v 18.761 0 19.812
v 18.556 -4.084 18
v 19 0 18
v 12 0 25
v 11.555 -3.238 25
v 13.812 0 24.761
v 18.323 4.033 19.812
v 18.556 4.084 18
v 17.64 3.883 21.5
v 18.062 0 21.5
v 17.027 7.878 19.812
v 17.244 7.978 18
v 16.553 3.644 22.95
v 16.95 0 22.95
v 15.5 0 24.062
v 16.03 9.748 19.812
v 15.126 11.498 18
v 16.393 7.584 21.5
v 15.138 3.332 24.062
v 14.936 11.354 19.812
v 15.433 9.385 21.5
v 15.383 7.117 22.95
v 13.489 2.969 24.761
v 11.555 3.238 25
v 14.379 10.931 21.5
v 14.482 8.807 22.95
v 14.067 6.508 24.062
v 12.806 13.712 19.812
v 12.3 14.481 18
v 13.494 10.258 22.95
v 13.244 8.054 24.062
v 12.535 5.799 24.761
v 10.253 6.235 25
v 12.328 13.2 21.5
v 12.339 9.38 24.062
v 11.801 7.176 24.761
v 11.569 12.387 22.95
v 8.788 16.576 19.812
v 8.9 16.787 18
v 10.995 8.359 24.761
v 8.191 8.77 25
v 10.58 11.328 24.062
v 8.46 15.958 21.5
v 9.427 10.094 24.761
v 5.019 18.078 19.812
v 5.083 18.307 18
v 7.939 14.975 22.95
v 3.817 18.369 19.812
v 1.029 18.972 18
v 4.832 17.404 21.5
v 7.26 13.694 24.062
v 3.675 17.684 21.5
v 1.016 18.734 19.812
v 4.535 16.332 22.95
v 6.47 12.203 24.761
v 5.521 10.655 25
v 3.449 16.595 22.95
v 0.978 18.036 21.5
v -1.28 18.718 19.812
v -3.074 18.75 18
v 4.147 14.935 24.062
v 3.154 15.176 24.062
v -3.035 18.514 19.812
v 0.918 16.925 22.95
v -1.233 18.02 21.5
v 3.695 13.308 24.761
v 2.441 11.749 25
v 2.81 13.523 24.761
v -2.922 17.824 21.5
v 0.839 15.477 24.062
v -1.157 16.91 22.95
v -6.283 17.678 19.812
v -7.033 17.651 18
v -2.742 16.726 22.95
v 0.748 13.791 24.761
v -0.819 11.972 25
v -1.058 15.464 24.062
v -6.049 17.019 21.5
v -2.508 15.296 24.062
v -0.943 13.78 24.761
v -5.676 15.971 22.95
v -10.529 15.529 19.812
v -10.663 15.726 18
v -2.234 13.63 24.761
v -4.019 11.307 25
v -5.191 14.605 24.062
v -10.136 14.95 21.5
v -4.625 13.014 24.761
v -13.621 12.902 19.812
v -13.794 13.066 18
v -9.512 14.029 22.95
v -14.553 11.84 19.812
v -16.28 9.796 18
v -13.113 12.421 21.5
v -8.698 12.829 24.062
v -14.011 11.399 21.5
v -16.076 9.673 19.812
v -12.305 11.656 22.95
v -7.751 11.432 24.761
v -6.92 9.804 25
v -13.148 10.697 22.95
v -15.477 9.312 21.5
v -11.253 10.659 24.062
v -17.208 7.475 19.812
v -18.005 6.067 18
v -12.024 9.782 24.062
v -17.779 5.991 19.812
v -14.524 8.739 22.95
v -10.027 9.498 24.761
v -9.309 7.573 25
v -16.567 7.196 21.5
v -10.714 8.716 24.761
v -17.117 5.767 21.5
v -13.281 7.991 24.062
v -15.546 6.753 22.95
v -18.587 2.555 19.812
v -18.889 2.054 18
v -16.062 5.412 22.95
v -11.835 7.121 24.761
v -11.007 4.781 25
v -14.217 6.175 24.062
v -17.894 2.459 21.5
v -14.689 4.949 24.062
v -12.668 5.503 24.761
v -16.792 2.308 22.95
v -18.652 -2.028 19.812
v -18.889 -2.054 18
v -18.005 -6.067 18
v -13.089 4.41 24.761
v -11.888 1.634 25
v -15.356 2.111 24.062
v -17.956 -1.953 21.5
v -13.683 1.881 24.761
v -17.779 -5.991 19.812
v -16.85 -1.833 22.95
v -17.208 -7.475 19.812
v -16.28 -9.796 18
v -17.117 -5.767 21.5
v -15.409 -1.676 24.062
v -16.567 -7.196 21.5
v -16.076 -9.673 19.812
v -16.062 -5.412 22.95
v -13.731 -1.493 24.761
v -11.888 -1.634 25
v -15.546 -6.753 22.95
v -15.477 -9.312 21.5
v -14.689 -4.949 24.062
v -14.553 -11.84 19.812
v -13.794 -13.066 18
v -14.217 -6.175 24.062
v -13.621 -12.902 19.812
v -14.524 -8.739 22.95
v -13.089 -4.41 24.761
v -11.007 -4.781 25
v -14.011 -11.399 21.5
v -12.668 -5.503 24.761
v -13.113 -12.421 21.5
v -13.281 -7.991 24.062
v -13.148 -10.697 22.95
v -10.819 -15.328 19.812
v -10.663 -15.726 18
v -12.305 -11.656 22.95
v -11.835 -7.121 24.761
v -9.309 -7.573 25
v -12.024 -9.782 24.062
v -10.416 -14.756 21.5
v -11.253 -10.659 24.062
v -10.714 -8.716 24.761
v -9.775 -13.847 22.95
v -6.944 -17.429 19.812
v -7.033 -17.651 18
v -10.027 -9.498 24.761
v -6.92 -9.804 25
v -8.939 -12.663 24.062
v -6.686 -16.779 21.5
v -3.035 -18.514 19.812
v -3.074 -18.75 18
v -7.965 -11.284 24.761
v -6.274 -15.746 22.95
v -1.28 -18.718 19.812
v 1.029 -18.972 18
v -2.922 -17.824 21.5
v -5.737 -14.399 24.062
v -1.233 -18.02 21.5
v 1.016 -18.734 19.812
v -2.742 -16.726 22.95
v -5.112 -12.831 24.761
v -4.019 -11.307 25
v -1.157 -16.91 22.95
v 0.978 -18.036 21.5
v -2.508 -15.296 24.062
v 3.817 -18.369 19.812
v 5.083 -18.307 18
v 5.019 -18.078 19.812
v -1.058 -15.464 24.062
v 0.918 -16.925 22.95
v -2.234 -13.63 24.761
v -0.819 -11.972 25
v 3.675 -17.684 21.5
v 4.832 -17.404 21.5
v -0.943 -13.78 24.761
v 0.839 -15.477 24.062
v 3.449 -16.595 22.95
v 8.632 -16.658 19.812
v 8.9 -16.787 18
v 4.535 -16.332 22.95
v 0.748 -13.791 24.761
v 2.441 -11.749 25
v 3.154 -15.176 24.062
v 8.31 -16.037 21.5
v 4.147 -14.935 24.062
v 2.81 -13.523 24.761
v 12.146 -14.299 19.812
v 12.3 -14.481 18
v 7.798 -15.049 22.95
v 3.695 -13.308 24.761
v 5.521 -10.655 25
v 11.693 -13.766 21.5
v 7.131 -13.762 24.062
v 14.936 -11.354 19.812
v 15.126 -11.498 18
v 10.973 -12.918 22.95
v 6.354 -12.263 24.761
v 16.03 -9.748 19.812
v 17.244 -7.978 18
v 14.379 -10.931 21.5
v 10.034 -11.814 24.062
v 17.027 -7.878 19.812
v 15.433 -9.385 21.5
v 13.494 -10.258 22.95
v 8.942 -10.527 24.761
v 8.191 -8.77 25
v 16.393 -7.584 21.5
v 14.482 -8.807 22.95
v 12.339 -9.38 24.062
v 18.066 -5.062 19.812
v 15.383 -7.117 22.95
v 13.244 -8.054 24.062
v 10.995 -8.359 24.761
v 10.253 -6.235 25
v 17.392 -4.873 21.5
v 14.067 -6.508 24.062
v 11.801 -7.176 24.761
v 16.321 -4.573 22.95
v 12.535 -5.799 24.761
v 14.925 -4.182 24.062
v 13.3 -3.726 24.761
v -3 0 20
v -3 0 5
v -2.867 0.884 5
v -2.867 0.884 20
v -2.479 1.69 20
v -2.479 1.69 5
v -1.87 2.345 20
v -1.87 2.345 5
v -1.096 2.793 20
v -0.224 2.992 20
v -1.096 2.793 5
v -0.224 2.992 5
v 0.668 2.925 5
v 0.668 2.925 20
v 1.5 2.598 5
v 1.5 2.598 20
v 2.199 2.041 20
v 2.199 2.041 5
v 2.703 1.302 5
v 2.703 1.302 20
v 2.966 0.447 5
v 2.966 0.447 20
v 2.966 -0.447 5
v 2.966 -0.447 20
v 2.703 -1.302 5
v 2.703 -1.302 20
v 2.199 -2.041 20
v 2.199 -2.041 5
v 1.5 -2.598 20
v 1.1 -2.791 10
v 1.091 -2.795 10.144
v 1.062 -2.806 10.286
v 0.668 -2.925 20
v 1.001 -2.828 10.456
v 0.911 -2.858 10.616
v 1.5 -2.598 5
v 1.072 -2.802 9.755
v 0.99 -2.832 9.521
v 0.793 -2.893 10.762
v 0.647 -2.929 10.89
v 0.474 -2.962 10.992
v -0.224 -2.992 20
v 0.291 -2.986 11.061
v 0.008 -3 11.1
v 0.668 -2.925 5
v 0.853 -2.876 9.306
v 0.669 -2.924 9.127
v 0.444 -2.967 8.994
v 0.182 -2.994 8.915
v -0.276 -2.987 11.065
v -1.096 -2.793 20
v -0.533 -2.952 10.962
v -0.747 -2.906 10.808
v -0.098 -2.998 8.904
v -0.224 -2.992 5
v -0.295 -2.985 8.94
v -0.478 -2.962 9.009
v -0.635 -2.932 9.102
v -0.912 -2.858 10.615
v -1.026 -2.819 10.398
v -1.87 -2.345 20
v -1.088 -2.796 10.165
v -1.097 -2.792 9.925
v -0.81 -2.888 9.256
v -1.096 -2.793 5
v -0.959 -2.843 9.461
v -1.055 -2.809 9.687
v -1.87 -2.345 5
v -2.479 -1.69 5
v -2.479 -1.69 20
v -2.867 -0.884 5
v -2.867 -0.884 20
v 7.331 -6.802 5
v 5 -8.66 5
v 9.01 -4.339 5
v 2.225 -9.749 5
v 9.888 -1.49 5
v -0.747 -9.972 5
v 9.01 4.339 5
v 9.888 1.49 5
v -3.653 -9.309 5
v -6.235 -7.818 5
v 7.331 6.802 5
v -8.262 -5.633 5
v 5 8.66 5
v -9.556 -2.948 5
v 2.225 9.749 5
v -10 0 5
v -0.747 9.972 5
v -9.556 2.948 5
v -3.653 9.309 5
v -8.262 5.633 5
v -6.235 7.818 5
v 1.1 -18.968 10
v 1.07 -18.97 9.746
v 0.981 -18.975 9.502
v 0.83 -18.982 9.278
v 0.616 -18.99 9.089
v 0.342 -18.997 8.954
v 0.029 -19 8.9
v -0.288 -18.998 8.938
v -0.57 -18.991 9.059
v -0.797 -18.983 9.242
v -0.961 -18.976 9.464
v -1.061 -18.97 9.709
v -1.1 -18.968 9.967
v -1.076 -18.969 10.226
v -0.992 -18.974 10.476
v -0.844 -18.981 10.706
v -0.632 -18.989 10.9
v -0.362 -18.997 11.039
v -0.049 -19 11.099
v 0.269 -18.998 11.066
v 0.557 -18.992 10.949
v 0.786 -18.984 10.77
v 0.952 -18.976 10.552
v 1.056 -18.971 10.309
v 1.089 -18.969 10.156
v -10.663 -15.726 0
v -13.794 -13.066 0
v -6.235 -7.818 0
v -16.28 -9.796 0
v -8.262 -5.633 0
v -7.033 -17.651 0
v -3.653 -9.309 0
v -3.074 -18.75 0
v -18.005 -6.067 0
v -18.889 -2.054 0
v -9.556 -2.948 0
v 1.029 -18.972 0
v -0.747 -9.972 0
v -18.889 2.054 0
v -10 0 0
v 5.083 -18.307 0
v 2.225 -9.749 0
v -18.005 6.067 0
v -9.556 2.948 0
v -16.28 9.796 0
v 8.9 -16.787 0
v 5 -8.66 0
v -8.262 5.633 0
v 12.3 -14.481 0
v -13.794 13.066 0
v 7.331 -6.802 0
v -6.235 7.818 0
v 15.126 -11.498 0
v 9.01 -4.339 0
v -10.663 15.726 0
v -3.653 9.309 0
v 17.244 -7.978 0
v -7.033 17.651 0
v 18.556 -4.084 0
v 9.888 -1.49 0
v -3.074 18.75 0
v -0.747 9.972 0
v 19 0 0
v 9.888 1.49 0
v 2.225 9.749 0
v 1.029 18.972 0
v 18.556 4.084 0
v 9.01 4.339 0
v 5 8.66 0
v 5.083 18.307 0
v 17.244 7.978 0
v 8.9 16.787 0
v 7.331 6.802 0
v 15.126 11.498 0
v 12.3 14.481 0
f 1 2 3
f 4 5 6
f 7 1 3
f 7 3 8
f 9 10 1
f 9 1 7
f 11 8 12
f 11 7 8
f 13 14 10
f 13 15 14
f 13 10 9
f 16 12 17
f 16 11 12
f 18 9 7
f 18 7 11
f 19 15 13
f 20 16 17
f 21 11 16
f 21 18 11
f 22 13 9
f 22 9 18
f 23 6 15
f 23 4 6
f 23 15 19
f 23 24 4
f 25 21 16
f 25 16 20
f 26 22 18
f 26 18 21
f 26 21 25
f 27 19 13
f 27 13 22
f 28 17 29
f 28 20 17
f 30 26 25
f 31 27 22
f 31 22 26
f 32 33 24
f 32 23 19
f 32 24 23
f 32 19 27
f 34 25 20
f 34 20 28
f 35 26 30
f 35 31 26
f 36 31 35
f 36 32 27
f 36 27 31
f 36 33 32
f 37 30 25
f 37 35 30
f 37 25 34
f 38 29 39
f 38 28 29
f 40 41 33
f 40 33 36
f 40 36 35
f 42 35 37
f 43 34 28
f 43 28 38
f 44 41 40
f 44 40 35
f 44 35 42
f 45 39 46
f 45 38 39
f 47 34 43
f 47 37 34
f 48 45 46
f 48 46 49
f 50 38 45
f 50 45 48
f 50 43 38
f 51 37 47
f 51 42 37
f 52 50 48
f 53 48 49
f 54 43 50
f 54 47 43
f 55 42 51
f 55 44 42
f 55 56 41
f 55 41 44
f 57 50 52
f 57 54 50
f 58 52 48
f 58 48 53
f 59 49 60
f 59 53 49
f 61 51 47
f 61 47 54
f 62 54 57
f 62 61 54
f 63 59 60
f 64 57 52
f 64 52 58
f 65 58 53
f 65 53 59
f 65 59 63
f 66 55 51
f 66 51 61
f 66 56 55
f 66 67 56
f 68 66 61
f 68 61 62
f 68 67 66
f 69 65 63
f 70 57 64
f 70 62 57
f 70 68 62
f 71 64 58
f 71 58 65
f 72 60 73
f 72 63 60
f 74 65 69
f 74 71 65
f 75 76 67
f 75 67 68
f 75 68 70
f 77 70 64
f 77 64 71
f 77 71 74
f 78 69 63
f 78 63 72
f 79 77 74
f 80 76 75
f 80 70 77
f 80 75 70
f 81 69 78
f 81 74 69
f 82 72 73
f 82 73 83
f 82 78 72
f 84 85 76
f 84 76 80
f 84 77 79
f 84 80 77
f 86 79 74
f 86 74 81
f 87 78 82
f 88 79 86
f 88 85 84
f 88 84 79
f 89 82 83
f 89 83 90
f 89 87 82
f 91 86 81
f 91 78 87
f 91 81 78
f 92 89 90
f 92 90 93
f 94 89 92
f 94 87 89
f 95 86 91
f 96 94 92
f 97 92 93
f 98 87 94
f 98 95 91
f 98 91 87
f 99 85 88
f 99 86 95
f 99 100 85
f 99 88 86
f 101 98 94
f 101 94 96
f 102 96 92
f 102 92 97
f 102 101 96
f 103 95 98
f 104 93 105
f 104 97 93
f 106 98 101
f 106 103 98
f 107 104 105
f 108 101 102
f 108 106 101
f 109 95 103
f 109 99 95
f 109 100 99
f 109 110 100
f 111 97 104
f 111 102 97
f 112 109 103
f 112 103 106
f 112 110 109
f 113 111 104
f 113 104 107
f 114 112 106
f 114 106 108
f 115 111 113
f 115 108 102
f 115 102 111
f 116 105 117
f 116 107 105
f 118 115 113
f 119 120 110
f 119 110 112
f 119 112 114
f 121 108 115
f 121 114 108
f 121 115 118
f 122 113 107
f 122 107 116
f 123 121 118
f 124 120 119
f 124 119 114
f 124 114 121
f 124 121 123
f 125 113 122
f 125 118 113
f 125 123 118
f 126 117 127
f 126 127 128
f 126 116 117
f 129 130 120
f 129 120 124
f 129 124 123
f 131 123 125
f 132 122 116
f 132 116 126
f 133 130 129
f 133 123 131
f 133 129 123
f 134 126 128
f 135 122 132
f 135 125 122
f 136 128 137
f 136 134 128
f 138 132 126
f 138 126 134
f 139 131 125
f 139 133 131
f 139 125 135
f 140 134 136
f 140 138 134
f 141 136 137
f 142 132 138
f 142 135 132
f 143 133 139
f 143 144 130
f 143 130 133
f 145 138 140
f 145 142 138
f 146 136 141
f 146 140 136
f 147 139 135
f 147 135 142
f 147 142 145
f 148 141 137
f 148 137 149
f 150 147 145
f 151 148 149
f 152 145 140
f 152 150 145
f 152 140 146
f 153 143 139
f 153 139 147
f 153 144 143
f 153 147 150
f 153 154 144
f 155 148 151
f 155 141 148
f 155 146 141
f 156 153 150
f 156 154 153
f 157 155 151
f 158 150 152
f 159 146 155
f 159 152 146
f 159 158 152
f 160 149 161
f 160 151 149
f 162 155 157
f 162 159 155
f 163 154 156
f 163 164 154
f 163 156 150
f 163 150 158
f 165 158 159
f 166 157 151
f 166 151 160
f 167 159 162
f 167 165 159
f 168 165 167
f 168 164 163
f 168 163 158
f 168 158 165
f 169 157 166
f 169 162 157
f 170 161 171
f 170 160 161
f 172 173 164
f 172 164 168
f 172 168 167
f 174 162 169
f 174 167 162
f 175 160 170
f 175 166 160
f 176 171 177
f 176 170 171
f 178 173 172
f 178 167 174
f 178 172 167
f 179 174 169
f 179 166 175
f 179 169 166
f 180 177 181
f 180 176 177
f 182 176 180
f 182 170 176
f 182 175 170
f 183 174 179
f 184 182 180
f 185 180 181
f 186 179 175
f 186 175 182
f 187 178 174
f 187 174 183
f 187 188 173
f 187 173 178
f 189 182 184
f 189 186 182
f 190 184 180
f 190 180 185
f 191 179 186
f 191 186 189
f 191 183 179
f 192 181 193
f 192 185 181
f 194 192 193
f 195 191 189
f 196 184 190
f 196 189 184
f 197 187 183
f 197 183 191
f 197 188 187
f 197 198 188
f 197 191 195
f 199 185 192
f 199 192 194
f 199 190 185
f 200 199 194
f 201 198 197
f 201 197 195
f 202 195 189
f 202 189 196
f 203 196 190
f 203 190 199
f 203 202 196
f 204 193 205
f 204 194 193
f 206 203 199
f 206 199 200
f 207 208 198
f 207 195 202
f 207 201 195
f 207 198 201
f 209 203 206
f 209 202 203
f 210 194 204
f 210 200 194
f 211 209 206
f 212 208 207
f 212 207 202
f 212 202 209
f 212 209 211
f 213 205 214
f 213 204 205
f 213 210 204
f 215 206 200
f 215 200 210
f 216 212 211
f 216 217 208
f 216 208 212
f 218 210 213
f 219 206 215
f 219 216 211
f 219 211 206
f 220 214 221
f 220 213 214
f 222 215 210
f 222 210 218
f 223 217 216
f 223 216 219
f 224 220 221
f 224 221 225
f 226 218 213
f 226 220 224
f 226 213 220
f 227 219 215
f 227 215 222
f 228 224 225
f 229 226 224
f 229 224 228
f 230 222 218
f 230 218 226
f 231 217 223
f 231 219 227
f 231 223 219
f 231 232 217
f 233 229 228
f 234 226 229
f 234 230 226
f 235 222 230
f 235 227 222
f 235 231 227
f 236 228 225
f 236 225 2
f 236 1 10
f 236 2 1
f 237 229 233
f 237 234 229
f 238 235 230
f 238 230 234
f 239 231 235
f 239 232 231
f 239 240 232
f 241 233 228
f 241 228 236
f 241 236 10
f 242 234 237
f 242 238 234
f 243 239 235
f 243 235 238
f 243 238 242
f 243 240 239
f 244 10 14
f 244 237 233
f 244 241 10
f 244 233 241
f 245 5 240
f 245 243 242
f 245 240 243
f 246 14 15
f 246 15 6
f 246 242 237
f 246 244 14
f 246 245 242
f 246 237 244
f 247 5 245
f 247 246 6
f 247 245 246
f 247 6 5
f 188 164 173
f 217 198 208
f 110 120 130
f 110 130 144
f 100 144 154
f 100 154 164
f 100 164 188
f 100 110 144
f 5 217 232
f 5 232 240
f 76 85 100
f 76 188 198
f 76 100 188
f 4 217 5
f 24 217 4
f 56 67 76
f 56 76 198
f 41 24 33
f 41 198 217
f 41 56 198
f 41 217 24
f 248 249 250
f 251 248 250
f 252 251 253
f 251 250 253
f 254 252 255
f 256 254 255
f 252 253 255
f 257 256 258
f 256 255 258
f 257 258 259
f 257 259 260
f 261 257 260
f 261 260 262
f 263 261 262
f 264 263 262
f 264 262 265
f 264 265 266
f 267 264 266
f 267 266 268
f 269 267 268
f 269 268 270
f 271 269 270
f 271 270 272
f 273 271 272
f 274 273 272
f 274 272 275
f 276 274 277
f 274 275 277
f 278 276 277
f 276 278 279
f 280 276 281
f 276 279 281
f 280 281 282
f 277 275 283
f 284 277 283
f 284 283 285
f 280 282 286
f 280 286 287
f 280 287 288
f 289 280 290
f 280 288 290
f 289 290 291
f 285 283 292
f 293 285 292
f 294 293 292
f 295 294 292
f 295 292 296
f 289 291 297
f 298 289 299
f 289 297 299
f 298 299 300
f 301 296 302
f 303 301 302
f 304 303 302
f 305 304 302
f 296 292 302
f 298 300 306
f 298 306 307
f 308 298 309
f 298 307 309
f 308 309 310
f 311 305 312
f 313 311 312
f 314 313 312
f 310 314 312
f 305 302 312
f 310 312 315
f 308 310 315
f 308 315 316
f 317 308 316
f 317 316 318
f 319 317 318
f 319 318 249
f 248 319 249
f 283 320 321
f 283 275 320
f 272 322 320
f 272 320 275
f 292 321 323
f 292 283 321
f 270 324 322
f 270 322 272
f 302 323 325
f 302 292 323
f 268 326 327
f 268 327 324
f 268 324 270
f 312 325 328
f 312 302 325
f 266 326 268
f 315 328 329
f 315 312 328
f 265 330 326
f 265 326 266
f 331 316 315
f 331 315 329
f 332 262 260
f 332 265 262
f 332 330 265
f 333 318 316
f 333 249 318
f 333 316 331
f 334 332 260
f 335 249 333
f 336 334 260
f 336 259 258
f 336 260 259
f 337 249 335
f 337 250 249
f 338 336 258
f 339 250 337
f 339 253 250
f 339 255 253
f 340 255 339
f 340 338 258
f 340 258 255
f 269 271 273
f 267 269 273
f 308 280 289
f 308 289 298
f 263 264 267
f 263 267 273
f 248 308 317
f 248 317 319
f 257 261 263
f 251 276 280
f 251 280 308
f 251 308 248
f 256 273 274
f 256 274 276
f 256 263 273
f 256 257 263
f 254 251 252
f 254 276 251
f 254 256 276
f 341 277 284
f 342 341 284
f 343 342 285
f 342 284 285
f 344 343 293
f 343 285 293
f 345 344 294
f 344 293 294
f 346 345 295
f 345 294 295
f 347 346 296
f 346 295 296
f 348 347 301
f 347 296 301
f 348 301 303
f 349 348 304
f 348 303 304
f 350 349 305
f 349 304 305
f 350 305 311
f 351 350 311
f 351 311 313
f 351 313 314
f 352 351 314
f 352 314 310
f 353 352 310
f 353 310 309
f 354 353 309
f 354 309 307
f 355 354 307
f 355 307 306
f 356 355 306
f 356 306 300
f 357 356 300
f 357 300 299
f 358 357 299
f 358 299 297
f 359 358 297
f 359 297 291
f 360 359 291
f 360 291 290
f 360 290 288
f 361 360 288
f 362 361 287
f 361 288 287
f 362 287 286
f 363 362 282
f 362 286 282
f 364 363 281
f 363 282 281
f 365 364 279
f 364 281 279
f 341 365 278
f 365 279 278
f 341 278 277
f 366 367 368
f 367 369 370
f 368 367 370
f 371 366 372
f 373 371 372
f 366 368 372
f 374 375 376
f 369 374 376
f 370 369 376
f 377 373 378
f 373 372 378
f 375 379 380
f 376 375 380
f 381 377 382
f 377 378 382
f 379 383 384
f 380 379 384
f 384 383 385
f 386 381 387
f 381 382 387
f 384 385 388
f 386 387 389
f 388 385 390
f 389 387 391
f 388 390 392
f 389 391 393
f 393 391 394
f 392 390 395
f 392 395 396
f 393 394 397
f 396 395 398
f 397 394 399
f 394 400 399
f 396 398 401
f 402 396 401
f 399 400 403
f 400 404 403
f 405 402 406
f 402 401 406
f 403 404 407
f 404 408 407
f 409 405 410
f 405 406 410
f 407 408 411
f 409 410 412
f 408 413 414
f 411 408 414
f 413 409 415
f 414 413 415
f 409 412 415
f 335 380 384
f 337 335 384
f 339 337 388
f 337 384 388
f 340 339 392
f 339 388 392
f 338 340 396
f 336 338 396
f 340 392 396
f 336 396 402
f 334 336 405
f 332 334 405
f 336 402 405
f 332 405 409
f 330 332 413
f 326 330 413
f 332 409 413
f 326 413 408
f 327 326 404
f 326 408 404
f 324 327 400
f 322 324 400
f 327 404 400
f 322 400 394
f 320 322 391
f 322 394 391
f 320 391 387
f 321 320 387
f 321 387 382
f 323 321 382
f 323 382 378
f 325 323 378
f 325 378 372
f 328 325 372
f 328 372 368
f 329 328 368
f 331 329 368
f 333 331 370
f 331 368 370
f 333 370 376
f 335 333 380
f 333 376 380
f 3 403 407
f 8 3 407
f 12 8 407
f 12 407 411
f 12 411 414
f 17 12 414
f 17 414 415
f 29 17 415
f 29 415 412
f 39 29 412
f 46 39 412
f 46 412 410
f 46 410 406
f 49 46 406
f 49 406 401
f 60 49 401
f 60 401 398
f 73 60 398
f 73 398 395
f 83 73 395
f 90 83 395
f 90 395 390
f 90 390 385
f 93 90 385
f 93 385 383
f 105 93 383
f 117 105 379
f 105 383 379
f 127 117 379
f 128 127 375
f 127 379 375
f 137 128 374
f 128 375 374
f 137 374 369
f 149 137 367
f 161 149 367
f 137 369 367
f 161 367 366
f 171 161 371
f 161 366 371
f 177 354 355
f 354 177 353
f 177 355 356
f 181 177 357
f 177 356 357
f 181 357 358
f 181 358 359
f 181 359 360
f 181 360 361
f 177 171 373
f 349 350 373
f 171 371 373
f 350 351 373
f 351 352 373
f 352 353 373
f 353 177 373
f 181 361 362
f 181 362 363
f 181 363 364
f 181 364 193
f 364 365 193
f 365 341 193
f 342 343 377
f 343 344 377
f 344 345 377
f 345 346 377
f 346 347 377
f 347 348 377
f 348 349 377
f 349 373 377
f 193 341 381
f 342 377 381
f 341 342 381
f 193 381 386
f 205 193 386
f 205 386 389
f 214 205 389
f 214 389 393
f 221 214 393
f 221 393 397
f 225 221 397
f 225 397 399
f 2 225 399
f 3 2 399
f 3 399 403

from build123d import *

# Parameters (mm, degrees)
SKETCH_1_R          = 19
EXTRUDE_1_DEPTH     = 25
SKETCH_2_R          = 10
CUT_EXTRUDE_1_DEPTH = 5
SKETCH_3_R          = 3
CUT_EXTRUDE_2_DEPTH = 15
CUT_EXTRUDE_3_REACH = 21
SKETCH_4_R          = 1.1
FILLET_1_R          = 7


with BuildPart() as part:
    # 草圖1 → 填料-伸長1 (new body)
    with BuildSketch(Plane.XY):
        Circle(SKETCH_1_R)
    extrude(amount=EXTRUDE_1_DEPTH)

    # 草圖2 → 除料-伸長1 (cut)
    with BuildSketch(Plane(origin=(0, 0, 0), x_dir=(-1, 0, 0), z_dir=(0, 0, -1))):
        Circle(SKETCH_2_R)
    extrude(amount=-CUT_EXTRUDE_1_DEPTH, mode=Mode.SUBTRACT)

    # 草圖3 → 除料-伸長2 (cut)
    with BuildSketch(Plane(origin=(0, 0, 5), x_dir=(-1, 0, 0), z_dir=(0, 0, -1))):
        Circle(SKETCH_3_R)
    extrude(amount=-CUT_EXTRUDE_2_DEPTH, mode=Mode.SUBTRACT)

    # 草圖4 → 除料-伸長3 (cut, up to next)
    with BuildSketch(Plane(origin=(0, 0, 0), x_dir=(1, 0, 0), z_dir=(0, 1, 0)), mode=Mode.PRIVATE) as cut_extrude_3_sk1:
        with Locations((0, -10)):
            Circle(SKETCH_4_R)
    cut_extrude_3_tool1 = extrude(cut_extrude_3_sk1.sketch, amount=-CUT_EXTRUDE_3_REACH, mode=Mode.PRIVATE) & part.part
    add(cut_extrude_3_tool1.solids().sort_by_distance((0, 0, 10))[0], mode=Mode.SUBTRACT)

    # 圓角1
    fillet_1_edges = [part.edges().sort_by_distance(p)[0] for p in [
        (-19, 0, 25),
    ]]
    fillet(fillet_1_edges, radius=FILLET_1_R)


solid = part.part
